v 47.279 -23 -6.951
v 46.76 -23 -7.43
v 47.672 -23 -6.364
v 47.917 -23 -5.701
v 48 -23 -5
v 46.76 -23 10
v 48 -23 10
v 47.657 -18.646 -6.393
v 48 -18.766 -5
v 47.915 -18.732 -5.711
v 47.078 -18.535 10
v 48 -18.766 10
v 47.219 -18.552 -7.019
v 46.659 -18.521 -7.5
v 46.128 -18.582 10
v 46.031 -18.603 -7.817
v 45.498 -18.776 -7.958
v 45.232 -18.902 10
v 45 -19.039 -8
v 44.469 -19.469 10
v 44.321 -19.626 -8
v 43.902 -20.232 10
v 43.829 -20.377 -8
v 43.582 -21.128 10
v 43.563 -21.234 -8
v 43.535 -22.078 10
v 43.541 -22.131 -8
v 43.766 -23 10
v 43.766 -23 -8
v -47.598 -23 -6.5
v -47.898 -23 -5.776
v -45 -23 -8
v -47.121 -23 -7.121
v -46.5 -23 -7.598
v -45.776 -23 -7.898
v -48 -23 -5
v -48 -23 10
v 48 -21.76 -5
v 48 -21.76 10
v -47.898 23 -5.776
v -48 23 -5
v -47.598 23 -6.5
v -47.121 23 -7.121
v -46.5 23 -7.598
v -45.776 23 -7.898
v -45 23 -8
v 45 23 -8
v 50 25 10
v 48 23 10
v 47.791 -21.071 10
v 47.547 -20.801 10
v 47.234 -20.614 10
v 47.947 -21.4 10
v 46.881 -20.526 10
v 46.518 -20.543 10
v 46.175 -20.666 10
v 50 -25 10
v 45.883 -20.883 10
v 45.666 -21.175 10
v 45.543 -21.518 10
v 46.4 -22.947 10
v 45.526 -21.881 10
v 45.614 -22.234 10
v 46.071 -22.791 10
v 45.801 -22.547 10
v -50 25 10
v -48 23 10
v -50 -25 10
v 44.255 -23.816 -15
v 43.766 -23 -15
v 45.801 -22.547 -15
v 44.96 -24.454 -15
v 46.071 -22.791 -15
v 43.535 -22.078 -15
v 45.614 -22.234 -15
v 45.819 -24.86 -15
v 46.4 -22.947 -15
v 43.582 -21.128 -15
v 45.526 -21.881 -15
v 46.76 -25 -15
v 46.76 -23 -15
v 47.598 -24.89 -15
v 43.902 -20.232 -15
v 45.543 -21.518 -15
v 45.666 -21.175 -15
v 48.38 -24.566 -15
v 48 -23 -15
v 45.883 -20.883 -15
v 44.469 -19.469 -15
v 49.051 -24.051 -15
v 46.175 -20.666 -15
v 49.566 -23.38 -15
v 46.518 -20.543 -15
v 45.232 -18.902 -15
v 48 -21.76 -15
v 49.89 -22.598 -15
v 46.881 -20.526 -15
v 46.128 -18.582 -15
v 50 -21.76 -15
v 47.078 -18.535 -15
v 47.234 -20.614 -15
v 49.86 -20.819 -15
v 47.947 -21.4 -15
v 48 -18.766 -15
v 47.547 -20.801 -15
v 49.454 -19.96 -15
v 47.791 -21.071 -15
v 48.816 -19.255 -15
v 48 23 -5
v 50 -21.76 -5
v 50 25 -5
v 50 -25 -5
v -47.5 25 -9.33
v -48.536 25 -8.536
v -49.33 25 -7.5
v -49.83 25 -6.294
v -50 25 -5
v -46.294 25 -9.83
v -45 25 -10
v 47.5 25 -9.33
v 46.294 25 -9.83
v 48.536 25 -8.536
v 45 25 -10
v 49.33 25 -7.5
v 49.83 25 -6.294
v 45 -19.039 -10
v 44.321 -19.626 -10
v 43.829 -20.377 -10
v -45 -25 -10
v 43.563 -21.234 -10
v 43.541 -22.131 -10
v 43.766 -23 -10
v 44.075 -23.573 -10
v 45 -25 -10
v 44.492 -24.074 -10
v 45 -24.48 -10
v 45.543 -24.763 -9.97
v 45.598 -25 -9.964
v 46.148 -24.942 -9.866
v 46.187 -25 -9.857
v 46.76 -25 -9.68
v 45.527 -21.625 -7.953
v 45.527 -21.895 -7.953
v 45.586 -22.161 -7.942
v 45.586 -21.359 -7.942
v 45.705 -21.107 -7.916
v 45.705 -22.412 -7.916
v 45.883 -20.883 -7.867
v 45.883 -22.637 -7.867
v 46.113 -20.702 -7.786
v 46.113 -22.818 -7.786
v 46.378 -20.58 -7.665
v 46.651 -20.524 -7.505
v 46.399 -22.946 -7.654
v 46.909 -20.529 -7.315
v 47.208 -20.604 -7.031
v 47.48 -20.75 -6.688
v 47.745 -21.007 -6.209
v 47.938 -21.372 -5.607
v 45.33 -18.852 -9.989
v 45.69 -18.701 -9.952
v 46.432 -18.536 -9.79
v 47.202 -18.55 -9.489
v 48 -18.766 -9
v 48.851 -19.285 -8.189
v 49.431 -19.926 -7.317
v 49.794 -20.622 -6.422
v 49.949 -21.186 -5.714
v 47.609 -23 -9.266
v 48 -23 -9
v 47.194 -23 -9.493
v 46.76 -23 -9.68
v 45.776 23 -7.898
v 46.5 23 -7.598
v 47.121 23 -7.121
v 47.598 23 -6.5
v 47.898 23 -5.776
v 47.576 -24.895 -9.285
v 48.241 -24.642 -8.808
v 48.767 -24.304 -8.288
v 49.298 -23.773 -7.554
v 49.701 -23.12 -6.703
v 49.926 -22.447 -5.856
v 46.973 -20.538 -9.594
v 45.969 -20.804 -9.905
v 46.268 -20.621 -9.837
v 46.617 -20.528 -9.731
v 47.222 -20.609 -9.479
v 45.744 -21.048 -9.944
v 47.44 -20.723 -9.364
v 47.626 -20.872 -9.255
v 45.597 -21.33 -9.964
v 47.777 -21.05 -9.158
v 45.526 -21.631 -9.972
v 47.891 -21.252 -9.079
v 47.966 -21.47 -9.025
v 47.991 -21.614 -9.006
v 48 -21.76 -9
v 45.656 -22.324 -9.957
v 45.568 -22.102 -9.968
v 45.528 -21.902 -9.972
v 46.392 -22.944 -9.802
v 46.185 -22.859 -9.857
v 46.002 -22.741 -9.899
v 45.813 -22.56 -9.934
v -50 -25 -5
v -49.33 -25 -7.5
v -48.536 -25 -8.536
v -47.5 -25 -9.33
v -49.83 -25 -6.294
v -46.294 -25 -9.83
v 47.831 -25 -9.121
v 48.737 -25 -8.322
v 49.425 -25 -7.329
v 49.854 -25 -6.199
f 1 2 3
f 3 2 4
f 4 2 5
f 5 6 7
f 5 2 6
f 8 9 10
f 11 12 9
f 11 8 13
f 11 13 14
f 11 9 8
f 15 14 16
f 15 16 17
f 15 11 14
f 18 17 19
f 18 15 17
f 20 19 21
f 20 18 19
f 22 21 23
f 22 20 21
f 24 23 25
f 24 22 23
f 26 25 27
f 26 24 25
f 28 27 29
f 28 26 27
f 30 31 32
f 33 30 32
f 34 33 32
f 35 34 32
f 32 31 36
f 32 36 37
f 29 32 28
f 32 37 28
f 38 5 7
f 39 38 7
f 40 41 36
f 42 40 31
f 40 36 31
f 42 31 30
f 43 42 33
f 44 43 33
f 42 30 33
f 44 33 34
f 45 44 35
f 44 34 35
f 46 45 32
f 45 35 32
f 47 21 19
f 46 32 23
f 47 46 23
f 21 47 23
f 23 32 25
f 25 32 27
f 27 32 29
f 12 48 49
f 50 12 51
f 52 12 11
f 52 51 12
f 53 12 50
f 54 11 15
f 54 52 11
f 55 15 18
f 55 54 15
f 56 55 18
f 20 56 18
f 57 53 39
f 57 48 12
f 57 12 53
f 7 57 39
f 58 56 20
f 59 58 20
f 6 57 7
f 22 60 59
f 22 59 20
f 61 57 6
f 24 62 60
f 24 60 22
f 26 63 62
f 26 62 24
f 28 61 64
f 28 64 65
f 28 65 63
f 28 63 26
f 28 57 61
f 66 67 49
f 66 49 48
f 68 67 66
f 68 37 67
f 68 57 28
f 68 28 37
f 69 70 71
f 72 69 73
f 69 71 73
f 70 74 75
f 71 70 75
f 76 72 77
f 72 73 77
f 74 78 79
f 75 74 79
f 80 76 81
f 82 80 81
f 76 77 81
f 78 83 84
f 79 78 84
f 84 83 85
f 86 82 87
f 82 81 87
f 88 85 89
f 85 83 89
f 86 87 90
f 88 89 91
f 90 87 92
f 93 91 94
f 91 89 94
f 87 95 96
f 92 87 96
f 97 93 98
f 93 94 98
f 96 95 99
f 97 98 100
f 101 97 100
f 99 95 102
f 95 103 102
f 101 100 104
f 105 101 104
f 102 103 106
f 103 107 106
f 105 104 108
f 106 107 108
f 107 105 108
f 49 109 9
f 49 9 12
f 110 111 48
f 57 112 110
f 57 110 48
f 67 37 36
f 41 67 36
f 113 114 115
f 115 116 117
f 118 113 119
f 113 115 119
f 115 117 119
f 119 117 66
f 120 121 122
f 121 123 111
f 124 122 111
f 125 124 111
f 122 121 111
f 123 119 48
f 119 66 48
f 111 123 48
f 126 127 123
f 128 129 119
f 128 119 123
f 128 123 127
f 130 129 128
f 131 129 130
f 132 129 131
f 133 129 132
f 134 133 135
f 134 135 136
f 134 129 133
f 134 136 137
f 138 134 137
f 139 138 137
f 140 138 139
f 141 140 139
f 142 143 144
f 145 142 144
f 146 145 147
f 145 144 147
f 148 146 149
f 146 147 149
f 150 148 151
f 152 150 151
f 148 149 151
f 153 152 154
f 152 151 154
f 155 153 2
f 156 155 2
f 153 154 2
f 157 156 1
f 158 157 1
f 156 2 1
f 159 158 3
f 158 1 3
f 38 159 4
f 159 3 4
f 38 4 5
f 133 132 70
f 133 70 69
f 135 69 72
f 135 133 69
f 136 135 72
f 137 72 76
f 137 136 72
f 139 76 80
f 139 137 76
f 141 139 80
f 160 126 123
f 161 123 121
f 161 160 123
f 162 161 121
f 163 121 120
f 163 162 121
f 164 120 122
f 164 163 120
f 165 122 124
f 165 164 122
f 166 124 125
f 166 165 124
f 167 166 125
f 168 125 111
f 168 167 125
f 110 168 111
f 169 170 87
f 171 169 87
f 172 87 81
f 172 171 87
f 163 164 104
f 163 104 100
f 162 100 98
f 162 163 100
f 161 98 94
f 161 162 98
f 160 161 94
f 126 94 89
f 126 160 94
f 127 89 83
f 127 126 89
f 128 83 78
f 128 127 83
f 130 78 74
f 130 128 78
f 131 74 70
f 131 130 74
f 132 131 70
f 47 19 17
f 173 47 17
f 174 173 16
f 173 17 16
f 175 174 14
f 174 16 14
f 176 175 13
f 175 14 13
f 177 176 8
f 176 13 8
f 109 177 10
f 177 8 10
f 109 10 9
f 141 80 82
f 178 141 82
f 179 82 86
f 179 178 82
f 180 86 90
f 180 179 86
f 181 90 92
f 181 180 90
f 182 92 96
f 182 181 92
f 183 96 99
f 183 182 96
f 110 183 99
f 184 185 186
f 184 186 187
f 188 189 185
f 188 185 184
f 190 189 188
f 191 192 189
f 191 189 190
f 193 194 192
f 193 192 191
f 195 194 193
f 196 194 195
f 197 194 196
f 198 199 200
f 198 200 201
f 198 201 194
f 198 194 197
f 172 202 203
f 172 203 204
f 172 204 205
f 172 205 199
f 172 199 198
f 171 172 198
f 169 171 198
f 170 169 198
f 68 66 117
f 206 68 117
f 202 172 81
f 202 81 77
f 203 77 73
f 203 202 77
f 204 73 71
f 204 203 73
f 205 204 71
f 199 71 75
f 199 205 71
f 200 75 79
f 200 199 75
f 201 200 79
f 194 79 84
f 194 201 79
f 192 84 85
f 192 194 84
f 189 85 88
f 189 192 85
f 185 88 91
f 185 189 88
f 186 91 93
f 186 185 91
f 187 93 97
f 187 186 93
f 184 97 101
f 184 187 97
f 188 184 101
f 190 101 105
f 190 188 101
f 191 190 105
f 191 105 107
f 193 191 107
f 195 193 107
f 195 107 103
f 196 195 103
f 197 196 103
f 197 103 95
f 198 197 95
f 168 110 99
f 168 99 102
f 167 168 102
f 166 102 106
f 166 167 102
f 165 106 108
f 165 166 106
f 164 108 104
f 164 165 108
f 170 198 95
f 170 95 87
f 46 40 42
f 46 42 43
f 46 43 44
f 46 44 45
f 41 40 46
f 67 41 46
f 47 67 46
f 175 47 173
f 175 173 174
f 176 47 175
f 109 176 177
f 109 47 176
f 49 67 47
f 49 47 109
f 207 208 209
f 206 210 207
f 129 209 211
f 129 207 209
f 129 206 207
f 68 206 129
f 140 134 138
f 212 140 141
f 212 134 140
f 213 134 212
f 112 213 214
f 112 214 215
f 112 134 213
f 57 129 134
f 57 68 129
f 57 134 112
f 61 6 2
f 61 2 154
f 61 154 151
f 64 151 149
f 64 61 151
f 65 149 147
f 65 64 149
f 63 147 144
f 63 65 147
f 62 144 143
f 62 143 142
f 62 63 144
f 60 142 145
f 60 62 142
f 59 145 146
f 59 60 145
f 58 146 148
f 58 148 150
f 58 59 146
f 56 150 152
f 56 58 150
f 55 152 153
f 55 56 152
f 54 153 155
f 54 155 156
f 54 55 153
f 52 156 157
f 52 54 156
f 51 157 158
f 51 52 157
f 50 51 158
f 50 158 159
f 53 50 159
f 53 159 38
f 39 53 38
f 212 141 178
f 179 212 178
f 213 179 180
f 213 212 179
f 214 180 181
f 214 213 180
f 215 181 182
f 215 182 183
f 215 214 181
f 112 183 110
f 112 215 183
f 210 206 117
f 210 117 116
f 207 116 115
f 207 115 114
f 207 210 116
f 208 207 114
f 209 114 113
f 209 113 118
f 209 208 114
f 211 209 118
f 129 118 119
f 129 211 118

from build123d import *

# Parameters (mm, degrees)
F1_DEPTH = 25
F2_T     = -2
F4_DEPTH = 25


with BuildPart() as f1:
    # F0 (on Front) → F1 (new body, symmetric)
    with BuildSketch(Plane.XZ):
        with BuildLine():
            Line((50, 10), (-50, 10))
            Line((-50, 10), (-50, -5))
            ThreePointArc((-50, -5), (-48.5355339059, -8.5355339059), (-45, -10))
            Line((-45, -10), (45, -10))
            ThreePointArc((45, -10), (48.5355339059, -8.5355339059), (50, -5))
            Line((50, -5), (50, 10))
        make_face()
    extrude(amount=F1_DEPTH, both=True)

    # F2
    f2_openings = [f1.faces().sort_by_distance(p)[0] for p in [
        (0, 0, 10),
    ]]
    offset(amount=F2_T, openings=f2_openings)

    # F3 (on face) → F4 (join)
    with BuildSketch(Plane.XY.offset(10)):
        with BuildLine():
            Line((48, -18.7663880923), (48, -21.7598285526))
            Line((48, -21.7598285526), (48, -23))
            Line((48, -23), (46.7598285526, -23))
            Line((46.7598285526, -23), (43.7663880923, -23))
            ThreePointArc((43.7663880923, -23), (44.9597809557, -24.4539962641), (46.7598286169, -25))
            ThreePointArc((46.7598286169, -25), (49.050975778, -24.0509757325), (50, -21.7598285526))
            ThreePointArc((50, -21.7598285526), (49.4539962462, -19.959780929), (48, -18.7663880923))
        make_face()
        with BuildLine():
            ThreePointArc((46.7598285526, -23), (45.8828949123, -20.8828949123), (48, -21.7598285526))
            Line((48, -21.7598285526), (48, -18.7663880923))
            ThreePointArc((48, -18.7663880923), (44.4686813499, -19.4686813499), (43.7663880923, -23))
            Line((43.7663880923, -23), (46.7598285526, -23))
        make_face()
    extrude(amount=-F4_DEPTH)


solid = f1.part
